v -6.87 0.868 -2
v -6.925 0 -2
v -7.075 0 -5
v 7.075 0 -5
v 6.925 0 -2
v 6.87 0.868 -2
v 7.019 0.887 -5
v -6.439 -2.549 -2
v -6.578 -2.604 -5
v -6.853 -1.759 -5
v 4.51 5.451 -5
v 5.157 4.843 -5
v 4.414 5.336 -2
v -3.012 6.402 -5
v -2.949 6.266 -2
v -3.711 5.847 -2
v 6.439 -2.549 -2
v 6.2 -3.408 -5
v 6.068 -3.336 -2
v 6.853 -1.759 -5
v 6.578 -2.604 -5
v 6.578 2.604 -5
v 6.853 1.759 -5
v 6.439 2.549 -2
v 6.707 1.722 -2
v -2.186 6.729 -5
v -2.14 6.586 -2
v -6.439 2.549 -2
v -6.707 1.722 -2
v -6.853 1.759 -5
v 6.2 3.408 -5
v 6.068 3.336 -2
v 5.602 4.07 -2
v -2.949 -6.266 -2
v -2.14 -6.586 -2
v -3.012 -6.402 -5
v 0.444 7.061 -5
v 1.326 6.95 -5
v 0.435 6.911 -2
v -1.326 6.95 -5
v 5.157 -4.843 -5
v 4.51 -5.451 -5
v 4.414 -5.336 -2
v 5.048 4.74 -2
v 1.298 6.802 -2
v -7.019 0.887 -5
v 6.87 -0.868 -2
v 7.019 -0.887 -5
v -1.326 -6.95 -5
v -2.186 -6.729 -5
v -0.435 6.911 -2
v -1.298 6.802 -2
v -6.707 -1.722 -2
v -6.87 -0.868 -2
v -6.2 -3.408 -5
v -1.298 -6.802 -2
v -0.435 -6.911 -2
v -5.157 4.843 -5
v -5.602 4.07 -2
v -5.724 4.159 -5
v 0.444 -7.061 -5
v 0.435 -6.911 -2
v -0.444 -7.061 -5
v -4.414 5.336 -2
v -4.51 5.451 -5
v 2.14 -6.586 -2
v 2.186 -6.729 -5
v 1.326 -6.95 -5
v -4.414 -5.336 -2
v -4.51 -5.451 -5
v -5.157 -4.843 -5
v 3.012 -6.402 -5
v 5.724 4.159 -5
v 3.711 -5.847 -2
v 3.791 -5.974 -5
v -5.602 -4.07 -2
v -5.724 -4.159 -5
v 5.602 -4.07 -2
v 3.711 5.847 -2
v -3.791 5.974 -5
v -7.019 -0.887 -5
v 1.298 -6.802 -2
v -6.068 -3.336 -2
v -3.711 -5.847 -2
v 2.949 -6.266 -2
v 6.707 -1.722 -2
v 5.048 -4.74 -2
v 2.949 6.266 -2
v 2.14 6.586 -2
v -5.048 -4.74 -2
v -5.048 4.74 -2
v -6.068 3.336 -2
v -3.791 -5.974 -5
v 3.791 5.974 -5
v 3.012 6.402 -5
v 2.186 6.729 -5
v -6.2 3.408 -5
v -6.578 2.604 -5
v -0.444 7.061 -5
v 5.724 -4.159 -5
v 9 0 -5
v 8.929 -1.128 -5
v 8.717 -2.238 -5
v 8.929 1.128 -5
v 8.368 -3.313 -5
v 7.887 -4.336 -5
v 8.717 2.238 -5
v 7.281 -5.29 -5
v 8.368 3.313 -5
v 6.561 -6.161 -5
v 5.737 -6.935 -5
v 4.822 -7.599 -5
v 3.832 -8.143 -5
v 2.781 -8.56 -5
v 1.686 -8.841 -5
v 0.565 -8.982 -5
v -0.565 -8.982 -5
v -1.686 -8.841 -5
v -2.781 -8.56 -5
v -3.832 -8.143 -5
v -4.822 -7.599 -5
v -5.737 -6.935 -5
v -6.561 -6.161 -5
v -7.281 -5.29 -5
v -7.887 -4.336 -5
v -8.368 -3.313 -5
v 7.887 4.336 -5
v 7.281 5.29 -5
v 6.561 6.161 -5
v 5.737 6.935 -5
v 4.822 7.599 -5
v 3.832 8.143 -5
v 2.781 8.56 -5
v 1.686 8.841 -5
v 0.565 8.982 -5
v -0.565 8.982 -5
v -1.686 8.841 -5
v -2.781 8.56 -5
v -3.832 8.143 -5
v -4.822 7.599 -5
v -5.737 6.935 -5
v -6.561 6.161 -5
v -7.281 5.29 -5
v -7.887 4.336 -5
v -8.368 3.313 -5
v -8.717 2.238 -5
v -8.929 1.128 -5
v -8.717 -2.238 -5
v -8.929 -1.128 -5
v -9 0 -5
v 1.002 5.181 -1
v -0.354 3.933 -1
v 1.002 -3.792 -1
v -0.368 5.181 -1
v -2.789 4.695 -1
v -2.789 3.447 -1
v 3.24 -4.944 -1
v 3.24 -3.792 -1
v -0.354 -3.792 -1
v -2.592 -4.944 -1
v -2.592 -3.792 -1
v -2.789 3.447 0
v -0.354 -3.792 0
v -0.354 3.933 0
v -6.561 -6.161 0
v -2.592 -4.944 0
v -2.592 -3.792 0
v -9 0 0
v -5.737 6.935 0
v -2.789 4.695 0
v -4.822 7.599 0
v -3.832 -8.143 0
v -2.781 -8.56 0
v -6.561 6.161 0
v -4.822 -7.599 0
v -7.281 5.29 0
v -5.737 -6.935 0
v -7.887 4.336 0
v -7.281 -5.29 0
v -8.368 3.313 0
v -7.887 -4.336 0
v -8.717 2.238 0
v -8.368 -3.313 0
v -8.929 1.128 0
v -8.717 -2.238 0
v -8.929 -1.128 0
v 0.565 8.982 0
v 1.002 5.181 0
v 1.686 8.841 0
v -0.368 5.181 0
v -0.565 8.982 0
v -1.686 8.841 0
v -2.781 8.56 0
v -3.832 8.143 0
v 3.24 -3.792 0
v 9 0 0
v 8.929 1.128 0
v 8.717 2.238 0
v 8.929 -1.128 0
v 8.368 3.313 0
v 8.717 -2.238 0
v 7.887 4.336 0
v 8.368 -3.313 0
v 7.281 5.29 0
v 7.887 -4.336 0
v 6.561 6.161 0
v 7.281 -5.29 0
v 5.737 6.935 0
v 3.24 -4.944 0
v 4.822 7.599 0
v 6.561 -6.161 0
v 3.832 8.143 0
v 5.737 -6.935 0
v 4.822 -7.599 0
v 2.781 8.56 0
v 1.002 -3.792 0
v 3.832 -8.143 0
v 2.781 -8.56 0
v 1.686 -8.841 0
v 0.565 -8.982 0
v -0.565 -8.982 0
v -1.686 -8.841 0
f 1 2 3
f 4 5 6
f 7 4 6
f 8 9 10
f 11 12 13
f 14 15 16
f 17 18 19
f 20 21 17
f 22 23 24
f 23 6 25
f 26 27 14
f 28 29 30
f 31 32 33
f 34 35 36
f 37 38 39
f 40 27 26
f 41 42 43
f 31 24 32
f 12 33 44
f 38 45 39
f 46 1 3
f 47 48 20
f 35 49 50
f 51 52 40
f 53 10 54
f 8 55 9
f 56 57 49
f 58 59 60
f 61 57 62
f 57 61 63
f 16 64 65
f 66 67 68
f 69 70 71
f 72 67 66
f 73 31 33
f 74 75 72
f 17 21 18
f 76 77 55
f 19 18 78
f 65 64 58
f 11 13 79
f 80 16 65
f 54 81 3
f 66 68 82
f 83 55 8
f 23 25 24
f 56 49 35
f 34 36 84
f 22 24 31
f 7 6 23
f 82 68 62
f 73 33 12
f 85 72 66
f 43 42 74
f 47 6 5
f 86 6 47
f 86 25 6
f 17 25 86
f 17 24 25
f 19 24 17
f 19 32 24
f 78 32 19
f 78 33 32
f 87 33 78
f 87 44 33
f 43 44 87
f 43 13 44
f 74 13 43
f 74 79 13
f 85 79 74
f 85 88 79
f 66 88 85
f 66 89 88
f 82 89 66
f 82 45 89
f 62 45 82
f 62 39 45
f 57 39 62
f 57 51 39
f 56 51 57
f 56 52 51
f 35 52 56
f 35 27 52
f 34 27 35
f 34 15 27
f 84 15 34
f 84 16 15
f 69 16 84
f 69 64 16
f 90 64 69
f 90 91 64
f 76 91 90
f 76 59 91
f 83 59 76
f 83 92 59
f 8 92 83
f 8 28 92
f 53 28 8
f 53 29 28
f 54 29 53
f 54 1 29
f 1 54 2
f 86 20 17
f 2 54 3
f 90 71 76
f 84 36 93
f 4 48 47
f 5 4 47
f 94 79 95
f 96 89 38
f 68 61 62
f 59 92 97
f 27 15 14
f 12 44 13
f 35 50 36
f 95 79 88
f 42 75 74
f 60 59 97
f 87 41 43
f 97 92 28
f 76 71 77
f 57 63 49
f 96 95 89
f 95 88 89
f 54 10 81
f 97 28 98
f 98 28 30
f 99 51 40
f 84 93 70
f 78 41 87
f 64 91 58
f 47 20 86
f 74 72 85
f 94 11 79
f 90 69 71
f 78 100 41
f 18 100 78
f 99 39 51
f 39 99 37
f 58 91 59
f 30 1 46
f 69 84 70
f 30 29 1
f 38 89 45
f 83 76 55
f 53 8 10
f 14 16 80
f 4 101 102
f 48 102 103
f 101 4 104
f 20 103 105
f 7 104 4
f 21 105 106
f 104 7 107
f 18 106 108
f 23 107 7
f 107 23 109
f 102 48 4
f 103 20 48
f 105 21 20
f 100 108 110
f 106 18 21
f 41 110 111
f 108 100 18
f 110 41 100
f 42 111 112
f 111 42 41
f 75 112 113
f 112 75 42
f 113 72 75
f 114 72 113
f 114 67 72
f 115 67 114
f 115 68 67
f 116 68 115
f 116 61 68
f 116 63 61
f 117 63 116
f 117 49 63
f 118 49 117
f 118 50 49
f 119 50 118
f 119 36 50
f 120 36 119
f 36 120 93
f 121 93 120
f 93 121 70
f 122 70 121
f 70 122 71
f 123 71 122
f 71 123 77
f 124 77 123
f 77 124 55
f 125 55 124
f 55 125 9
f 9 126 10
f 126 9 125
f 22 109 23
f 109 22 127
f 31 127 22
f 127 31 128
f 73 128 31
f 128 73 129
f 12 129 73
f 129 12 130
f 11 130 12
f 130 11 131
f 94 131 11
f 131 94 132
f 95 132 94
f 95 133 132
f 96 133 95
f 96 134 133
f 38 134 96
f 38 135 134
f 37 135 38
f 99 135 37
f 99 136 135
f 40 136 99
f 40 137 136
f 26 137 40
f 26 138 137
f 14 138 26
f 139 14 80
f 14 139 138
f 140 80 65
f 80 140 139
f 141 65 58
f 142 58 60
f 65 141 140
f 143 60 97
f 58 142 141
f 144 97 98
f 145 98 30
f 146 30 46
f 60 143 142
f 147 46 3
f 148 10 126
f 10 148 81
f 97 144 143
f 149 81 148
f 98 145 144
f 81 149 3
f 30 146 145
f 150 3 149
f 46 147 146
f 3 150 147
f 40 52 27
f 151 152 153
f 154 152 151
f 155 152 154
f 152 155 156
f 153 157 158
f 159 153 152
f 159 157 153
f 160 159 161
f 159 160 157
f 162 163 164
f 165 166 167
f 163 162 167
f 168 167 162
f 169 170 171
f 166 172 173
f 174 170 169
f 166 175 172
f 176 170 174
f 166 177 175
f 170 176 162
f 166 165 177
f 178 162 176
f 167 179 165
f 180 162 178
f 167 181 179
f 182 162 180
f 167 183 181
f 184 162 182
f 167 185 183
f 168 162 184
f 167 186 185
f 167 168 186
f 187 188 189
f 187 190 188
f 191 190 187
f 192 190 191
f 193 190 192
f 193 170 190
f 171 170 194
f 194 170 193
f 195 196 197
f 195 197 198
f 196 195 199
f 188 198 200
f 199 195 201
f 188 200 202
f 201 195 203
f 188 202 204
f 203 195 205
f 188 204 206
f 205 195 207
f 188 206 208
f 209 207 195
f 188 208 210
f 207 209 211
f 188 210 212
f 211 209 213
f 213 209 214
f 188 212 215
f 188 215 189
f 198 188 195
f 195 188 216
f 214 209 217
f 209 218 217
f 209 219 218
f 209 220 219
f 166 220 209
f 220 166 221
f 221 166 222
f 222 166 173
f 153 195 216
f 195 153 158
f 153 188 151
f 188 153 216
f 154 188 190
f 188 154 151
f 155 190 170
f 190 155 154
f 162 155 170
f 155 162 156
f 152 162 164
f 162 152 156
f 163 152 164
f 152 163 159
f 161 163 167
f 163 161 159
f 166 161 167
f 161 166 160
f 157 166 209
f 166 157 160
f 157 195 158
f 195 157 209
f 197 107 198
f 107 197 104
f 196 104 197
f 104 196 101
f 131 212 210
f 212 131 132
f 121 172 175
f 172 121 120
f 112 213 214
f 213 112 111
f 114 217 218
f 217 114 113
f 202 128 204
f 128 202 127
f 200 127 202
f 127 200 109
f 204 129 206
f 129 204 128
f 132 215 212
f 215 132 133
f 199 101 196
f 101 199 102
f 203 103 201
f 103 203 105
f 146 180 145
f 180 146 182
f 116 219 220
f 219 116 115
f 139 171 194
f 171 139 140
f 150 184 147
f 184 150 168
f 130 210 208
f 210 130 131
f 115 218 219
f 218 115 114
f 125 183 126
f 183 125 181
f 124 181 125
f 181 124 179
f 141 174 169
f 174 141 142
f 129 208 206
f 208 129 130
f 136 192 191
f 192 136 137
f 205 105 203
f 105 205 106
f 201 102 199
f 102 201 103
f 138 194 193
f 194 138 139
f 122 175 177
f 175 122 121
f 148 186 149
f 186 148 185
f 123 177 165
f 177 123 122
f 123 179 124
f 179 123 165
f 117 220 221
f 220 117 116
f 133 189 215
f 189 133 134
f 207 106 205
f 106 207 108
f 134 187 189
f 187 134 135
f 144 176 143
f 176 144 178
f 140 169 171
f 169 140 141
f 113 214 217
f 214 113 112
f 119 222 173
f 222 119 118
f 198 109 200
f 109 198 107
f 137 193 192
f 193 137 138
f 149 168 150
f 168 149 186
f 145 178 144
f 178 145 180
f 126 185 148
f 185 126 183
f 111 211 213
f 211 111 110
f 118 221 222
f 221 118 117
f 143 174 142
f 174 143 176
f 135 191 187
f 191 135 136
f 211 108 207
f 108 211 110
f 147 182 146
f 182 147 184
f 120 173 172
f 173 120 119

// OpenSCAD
$fn = 50;


difference() {
	union() {
		translate(v = [0, 0, -5.0000000000]) {
			cylinder(h = 5, r = 9.0000000000);
		}
	}
	union() {
		#translate(v = [0, 0, -5.0000000000]) {
			cylinder(h = 3, r1 = 7.0750000000, r2 = 6.9250000000);
		}
		translate(v = [0, 0, -1]) {
			linear_extrude(height = 1) {
				text(font = "Impact", halign = "center", size = 10, text = "1", valign = "center");
			}
		}
	}
}
